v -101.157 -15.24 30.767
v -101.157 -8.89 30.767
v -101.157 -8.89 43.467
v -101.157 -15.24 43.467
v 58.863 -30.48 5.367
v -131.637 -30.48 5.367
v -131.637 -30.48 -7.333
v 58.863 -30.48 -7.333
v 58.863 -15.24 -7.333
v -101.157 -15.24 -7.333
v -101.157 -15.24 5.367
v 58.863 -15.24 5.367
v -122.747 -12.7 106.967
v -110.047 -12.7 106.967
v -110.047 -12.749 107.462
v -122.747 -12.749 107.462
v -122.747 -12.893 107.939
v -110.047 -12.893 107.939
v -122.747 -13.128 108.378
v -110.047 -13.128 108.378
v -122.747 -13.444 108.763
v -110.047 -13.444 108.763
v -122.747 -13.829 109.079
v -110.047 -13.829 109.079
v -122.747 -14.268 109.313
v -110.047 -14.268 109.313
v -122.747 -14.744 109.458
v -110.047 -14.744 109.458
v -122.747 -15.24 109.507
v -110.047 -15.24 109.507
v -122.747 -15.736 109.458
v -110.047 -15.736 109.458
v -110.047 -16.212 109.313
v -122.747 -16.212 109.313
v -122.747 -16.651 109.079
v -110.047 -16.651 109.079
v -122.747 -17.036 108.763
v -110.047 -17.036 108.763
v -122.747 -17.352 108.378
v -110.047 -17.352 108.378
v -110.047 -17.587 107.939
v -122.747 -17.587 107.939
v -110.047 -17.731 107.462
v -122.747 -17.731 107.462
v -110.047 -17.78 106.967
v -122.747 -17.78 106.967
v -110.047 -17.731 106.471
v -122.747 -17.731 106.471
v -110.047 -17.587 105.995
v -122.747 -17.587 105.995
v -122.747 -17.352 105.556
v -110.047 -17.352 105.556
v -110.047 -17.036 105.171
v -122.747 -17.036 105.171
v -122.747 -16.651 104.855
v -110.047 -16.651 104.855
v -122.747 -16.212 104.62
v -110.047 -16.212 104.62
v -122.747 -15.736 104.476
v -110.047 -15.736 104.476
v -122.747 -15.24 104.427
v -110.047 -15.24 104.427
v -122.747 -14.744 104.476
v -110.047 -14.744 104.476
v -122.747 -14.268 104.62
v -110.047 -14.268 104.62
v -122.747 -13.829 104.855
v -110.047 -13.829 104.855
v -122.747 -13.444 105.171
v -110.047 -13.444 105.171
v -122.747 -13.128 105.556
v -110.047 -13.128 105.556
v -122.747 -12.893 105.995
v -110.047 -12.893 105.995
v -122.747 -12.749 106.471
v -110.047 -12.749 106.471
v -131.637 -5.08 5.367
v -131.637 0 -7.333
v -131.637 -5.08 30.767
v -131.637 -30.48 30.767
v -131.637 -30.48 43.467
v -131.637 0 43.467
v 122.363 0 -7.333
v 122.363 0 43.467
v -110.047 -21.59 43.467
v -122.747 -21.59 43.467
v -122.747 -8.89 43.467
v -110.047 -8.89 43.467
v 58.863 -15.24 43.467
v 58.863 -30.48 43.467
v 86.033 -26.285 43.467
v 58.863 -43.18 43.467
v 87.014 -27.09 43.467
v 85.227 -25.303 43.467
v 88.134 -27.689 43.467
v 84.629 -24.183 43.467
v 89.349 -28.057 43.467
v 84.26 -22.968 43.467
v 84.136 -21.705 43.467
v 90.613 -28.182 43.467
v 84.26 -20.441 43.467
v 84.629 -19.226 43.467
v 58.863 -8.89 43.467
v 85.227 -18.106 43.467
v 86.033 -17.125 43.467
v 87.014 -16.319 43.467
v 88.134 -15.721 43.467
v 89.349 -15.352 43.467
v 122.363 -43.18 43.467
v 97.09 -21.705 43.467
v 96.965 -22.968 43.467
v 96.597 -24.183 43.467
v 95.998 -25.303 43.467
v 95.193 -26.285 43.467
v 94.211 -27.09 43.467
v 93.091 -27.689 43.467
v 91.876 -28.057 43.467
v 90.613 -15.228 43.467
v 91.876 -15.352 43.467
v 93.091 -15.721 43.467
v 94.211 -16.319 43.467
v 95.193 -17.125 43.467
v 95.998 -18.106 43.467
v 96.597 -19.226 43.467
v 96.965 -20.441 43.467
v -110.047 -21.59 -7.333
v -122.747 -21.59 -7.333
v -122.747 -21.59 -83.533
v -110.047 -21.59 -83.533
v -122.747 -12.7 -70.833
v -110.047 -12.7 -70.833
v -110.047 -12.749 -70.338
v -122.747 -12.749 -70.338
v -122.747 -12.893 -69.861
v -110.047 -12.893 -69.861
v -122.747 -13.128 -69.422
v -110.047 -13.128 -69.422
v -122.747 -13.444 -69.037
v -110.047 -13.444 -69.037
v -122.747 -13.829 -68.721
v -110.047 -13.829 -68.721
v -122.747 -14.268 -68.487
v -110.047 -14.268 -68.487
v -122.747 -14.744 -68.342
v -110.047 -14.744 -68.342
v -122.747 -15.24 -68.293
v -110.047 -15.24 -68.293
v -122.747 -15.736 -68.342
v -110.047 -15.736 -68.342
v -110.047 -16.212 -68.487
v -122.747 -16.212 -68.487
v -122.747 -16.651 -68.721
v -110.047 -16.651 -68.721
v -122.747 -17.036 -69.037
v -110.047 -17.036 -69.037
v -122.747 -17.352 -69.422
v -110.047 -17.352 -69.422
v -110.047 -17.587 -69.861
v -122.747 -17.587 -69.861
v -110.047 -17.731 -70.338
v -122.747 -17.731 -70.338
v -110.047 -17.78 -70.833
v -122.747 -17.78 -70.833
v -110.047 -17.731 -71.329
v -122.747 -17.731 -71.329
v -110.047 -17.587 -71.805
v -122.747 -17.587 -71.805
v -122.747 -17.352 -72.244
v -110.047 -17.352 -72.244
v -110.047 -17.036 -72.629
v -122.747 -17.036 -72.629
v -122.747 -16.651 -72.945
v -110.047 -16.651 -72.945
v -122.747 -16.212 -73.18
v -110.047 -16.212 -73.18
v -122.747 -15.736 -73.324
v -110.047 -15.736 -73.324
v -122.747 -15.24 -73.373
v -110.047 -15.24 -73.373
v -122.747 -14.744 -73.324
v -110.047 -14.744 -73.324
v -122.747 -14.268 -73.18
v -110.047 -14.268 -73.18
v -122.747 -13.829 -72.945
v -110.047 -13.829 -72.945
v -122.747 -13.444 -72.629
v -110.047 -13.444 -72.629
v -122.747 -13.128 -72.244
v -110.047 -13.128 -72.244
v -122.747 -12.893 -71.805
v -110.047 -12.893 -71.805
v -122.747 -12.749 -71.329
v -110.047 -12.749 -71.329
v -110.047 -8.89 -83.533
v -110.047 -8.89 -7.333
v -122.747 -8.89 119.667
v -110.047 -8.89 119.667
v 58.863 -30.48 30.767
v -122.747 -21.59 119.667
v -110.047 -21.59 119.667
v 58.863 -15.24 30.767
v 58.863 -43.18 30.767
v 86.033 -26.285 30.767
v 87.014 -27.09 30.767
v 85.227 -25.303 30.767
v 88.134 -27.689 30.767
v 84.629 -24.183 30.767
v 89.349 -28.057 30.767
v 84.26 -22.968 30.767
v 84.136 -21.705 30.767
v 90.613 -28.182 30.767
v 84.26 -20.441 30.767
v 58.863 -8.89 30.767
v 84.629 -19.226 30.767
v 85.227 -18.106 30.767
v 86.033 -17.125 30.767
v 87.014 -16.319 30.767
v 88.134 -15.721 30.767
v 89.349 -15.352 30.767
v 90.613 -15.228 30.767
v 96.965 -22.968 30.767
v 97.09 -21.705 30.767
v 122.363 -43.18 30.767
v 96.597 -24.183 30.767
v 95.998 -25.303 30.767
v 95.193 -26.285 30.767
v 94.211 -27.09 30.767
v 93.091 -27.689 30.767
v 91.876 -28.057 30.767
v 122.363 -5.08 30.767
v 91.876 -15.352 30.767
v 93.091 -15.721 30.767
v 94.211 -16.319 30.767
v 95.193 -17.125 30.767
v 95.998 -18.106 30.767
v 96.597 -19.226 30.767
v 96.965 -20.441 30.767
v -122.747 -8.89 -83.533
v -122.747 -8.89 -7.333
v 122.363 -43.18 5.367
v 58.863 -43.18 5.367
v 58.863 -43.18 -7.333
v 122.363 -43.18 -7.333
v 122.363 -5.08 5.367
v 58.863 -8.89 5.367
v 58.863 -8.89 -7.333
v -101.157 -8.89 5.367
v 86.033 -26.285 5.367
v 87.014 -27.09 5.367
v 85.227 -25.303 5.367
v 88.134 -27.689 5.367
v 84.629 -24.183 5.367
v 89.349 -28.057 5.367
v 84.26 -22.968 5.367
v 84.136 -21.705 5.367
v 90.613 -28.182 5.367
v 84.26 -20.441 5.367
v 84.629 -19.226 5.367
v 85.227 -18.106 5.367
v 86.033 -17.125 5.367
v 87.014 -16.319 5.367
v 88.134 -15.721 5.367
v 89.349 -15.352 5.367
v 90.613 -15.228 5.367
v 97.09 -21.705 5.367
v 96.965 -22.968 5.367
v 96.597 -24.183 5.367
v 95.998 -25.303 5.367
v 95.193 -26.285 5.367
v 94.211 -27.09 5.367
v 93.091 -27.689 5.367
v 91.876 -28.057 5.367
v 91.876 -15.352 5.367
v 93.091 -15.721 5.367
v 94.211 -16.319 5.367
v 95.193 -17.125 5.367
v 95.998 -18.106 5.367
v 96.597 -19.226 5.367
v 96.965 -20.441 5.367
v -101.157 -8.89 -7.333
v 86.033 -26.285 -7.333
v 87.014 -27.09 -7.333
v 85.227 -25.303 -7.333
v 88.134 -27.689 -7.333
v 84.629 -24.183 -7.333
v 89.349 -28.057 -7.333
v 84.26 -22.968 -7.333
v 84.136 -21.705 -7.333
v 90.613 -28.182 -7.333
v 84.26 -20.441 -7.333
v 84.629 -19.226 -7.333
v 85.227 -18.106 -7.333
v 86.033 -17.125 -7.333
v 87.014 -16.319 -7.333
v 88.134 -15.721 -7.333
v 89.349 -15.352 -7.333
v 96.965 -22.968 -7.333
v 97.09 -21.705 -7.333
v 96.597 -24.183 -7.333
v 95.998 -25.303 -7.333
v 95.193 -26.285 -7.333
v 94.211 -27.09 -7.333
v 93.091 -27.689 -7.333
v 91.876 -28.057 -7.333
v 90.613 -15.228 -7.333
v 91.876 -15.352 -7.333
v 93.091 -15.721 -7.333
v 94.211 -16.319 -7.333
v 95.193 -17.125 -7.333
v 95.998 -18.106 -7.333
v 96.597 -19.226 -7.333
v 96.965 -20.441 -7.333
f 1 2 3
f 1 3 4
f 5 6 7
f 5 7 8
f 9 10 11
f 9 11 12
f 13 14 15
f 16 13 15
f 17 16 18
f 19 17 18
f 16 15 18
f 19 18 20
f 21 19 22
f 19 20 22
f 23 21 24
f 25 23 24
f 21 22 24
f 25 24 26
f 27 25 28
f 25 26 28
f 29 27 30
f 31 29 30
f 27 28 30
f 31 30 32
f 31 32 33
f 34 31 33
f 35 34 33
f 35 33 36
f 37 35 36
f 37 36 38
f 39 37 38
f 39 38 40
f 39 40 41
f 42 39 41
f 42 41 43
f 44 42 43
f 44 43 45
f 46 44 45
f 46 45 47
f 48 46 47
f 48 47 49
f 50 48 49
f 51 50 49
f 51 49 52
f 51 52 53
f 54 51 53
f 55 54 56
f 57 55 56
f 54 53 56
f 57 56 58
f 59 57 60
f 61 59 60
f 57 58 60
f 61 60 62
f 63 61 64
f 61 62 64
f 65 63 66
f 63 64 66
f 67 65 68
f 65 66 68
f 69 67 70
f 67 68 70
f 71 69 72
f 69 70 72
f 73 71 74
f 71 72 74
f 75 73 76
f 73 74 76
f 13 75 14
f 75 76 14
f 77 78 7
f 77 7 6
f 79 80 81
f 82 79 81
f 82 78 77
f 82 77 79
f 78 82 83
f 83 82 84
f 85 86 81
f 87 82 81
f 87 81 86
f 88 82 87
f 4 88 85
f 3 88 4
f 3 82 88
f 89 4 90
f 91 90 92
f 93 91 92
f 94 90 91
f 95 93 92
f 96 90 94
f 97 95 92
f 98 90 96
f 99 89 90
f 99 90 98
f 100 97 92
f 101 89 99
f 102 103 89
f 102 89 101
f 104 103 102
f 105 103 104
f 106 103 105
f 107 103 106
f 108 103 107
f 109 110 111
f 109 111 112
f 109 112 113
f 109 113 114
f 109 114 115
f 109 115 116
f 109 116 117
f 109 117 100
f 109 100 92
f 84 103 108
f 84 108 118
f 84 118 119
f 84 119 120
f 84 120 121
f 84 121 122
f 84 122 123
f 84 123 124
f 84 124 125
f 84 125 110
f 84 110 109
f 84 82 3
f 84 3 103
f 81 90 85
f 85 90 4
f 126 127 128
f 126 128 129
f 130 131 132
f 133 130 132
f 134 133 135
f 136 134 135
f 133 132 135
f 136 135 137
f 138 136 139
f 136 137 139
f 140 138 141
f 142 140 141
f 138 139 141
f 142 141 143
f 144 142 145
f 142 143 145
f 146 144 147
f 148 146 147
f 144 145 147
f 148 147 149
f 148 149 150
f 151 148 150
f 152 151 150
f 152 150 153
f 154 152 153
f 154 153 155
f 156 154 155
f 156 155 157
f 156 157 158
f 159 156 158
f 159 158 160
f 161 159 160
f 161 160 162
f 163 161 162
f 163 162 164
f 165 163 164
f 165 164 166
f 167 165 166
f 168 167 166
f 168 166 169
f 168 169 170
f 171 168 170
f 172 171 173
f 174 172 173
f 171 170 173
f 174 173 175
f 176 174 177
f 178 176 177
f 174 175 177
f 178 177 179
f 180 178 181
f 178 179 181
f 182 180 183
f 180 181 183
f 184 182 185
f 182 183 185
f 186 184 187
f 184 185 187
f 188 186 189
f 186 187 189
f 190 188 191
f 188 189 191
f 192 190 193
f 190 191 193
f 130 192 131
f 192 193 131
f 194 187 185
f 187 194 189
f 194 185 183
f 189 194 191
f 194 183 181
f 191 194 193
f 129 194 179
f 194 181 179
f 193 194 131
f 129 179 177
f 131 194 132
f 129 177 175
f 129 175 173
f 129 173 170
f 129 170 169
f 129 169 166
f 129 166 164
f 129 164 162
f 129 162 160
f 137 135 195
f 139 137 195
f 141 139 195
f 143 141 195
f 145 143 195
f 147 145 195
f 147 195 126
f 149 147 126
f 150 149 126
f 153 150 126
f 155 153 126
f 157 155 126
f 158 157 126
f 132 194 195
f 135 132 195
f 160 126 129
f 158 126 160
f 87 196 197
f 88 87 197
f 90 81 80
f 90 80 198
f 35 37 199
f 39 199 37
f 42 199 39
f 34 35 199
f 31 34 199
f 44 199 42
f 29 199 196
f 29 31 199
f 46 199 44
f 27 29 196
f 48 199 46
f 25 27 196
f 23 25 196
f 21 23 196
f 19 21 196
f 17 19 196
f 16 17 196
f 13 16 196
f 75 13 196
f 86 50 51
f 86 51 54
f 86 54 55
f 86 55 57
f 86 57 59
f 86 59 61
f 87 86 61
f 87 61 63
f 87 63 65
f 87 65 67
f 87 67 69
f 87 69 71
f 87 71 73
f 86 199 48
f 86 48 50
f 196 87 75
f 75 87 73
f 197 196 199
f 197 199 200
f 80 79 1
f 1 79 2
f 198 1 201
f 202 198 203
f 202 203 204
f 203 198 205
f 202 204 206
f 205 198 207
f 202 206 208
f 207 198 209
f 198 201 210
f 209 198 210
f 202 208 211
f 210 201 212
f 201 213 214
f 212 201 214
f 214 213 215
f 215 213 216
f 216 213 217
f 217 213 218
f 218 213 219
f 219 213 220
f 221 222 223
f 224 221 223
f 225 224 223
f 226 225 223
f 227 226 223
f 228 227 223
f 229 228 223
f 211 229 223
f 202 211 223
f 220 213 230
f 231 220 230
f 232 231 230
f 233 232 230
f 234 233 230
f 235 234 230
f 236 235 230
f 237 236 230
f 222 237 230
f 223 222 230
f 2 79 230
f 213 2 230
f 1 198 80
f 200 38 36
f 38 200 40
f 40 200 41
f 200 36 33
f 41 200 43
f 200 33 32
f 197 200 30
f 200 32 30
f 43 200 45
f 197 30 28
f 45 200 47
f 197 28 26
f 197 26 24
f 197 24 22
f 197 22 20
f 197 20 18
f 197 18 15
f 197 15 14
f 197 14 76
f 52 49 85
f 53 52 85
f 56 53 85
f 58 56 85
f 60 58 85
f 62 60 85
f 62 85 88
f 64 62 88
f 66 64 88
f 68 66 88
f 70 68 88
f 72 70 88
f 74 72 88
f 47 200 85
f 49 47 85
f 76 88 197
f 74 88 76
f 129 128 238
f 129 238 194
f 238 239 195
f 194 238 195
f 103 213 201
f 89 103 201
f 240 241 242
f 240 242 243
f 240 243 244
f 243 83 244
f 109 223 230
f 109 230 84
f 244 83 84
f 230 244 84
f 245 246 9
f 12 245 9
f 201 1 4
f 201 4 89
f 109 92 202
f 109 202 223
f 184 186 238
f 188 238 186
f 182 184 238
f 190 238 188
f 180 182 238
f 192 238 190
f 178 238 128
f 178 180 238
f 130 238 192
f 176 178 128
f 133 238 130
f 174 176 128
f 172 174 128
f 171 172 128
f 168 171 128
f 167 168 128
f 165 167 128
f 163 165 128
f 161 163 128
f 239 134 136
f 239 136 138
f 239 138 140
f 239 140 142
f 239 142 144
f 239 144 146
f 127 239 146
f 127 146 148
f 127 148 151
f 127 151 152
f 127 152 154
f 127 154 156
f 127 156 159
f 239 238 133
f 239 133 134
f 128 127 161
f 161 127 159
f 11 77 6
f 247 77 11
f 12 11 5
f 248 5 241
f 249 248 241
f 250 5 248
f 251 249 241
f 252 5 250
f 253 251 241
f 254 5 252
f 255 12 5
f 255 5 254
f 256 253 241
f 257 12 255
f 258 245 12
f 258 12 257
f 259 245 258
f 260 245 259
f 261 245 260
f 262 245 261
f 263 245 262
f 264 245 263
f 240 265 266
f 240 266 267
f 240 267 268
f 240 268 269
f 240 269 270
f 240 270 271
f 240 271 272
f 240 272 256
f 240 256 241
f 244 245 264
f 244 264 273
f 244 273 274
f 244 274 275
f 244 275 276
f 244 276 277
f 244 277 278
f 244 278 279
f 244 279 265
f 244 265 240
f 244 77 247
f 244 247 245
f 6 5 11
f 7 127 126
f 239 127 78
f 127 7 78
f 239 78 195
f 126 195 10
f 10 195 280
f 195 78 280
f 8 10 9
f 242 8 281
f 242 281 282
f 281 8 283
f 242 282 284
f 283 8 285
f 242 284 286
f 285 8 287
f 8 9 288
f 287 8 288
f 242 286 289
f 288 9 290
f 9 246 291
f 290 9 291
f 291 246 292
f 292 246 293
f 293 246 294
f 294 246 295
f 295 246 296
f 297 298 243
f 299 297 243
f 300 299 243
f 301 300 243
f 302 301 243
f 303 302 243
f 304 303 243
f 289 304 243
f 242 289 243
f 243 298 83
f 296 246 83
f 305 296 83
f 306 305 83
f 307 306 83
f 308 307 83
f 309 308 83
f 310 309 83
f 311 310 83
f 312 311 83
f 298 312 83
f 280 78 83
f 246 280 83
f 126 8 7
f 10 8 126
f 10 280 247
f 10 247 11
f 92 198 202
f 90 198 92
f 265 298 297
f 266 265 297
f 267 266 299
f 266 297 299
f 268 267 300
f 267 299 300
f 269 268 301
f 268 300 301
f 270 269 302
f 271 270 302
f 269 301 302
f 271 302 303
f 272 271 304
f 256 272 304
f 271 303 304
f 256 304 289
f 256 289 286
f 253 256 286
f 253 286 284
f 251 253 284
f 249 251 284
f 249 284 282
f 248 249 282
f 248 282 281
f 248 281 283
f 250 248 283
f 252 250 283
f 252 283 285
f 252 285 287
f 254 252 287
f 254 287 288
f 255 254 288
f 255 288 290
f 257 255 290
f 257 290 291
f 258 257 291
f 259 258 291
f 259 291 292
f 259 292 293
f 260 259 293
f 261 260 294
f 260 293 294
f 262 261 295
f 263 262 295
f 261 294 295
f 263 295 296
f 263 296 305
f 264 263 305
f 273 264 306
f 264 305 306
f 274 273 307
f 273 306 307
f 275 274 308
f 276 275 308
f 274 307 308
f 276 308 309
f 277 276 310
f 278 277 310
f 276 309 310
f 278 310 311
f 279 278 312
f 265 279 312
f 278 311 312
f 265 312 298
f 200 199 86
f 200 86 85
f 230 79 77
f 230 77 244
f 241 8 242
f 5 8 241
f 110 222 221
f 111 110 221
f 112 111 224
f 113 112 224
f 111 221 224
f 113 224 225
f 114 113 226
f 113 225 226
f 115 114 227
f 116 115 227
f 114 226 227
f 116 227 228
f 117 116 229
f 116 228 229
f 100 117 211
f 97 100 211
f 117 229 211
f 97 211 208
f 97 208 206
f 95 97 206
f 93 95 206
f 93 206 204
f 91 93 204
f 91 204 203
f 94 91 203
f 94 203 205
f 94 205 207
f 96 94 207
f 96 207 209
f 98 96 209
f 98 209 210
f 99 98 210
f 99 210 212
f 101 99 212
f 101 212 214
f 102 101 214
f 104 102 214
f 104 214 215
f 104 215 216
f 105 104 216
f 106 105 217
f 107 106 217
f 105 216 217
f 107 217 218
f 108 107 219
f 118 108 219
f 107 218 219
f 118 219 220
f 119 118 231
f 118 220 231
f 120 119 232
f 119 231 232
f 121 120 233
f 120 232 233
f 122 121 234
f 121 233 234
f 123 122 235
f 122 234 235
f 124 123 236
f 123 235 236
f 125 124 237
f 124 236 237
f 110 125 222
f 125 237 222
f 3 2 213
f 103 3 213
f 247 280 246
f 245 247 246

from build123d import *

# Parameters (mm, degrees)
F0_W      = 254
F0_H      = 50.8
F1_DEPTH  = 30.48
F2_W      = 254
F2_H      = 25.4
F3_DEPTH  = 25.4
F4_W      = 12.7
F4_H      = 12.7
F6_DEPTH  = 76.2
F5_W      = 12.7
F5_H      = 12.7
F7_DEPTH  = 76.2
F8_W      = 63.5
F8_H      = 12.7
F10_DEPTH = 12.7
F9_W      = 63.5
F9_H      = 12.7
F11_DEPTH = 12.7
F12_W     = 160.02
F12_H     = 6.35
F14_DEPTH = 127.001
F13_R     = 6.477
F15_DEPTH = 127.001
F16_R     = 2.54
F18_DEPTH = 25.4
F17_R     = 2.54
F19_DEPTH = 25.4


with BuildPart() as f1:
    # F0 (on Front) → F1 (new body)
    with BuildSketch(Plane.XZ):
        with Locations((-4.6371974824, 18.0667741224)):
            Rectangle(F0_W, F0_H)
    extrude(amount=F1_DEPTH)

    # F2 (on face) → F3 (cut)
    with BuildSketch(Plane.XZ.offset(30.48)):
        with Locations((-4.6371974824, 18.0667741224)):
            Rectangle(F2_W, F2_H)
    extrude(amount=-F3_DEPTH, mode=Mode.SUBTRACT)

    # F4 (on face) → F6 (join)
    with BuildSketch(Plane(origin=(0, 0, -7.3332258776), x_dir=(1, 0, 0), z_dir=(0, 0, -1))):
        with Locations((-116.3971974824, 15.24)):
            Rectangle(F4_W, F4_H)
    extrude(amount=F6_DEPTH)

    # F5 (on face) → F7 (join)
    with BuildSketch(Plane.XY.offset(43.4667741224)):
        with Locations((-116.3971974824, -15.24)):
            Rectangle(F5_W, F5_H)
    extrude(amount=F7_DEPTH)

    # F8 (on face) → F10 (join)
    with BuildSketch(Plane.XZ.offset(30.48)):
        with Locations((90.6128025176, 37.1167741224)):
            Rectangle(F8_W, F8_H)
    extrude(amount=F10_DEPTH)

    # F9 (on face) → F11 (join)
    with BuildSketch(Plane.XZ.offset(30.48)):
        with Locations((90.6128025176, -0.9832258776)):
            Rectangle(F9_W, F9_H)
    extrude(amount=F11_DEPTH)

    # F12 (on face) → F14 (cut, through all)
    with BuildSketch(Plane(origin=(0, 0, -7.3332258776), x_dir=(1, 0, 0), z_dir=(0, 0, -1))):
        with Locations((-21.1471974824, 12.065)):
            Rectangle(F12_W, F12_H)
    extrude(amount=-F14_DEPTH, mode=Mode.SUBTRACT)

    # F13 (on face) → F15 (cut, through all)
    with BuildSketch(Plane(origin=(0, 0, -7.3332258776), x_dir=(1, 0, 0), z_dir=(0, 0, -1))):
        with Locations((90.6128025176, 21.7048414052)):
            Circle(F13_R)
    extrude(amount=-F15_DEPTH, mode=Mode.SUBTRACT)

    # F16 (on face) → F18 (cut)
    with BuildSketch(Plane.YZ.offset(-110.0471974824)):
        with Locations((-15.24, -70.8332258776)):
            Circle(F16_R)
    extrude(amount=-F18_DEPTH, mode=Mode.SUBTRACT)

    # F17 (on face) → F19 (cut)
    with BuildSketch(Plane.YZ.offset(-110.0471974824)):
        with Locations((-15.24, 106.9667741224)):
            Circle(F17_R)
    extrude(amount=-F19_DEPTH, mode=Mode.SUBTRACT)


solid = f1.part
